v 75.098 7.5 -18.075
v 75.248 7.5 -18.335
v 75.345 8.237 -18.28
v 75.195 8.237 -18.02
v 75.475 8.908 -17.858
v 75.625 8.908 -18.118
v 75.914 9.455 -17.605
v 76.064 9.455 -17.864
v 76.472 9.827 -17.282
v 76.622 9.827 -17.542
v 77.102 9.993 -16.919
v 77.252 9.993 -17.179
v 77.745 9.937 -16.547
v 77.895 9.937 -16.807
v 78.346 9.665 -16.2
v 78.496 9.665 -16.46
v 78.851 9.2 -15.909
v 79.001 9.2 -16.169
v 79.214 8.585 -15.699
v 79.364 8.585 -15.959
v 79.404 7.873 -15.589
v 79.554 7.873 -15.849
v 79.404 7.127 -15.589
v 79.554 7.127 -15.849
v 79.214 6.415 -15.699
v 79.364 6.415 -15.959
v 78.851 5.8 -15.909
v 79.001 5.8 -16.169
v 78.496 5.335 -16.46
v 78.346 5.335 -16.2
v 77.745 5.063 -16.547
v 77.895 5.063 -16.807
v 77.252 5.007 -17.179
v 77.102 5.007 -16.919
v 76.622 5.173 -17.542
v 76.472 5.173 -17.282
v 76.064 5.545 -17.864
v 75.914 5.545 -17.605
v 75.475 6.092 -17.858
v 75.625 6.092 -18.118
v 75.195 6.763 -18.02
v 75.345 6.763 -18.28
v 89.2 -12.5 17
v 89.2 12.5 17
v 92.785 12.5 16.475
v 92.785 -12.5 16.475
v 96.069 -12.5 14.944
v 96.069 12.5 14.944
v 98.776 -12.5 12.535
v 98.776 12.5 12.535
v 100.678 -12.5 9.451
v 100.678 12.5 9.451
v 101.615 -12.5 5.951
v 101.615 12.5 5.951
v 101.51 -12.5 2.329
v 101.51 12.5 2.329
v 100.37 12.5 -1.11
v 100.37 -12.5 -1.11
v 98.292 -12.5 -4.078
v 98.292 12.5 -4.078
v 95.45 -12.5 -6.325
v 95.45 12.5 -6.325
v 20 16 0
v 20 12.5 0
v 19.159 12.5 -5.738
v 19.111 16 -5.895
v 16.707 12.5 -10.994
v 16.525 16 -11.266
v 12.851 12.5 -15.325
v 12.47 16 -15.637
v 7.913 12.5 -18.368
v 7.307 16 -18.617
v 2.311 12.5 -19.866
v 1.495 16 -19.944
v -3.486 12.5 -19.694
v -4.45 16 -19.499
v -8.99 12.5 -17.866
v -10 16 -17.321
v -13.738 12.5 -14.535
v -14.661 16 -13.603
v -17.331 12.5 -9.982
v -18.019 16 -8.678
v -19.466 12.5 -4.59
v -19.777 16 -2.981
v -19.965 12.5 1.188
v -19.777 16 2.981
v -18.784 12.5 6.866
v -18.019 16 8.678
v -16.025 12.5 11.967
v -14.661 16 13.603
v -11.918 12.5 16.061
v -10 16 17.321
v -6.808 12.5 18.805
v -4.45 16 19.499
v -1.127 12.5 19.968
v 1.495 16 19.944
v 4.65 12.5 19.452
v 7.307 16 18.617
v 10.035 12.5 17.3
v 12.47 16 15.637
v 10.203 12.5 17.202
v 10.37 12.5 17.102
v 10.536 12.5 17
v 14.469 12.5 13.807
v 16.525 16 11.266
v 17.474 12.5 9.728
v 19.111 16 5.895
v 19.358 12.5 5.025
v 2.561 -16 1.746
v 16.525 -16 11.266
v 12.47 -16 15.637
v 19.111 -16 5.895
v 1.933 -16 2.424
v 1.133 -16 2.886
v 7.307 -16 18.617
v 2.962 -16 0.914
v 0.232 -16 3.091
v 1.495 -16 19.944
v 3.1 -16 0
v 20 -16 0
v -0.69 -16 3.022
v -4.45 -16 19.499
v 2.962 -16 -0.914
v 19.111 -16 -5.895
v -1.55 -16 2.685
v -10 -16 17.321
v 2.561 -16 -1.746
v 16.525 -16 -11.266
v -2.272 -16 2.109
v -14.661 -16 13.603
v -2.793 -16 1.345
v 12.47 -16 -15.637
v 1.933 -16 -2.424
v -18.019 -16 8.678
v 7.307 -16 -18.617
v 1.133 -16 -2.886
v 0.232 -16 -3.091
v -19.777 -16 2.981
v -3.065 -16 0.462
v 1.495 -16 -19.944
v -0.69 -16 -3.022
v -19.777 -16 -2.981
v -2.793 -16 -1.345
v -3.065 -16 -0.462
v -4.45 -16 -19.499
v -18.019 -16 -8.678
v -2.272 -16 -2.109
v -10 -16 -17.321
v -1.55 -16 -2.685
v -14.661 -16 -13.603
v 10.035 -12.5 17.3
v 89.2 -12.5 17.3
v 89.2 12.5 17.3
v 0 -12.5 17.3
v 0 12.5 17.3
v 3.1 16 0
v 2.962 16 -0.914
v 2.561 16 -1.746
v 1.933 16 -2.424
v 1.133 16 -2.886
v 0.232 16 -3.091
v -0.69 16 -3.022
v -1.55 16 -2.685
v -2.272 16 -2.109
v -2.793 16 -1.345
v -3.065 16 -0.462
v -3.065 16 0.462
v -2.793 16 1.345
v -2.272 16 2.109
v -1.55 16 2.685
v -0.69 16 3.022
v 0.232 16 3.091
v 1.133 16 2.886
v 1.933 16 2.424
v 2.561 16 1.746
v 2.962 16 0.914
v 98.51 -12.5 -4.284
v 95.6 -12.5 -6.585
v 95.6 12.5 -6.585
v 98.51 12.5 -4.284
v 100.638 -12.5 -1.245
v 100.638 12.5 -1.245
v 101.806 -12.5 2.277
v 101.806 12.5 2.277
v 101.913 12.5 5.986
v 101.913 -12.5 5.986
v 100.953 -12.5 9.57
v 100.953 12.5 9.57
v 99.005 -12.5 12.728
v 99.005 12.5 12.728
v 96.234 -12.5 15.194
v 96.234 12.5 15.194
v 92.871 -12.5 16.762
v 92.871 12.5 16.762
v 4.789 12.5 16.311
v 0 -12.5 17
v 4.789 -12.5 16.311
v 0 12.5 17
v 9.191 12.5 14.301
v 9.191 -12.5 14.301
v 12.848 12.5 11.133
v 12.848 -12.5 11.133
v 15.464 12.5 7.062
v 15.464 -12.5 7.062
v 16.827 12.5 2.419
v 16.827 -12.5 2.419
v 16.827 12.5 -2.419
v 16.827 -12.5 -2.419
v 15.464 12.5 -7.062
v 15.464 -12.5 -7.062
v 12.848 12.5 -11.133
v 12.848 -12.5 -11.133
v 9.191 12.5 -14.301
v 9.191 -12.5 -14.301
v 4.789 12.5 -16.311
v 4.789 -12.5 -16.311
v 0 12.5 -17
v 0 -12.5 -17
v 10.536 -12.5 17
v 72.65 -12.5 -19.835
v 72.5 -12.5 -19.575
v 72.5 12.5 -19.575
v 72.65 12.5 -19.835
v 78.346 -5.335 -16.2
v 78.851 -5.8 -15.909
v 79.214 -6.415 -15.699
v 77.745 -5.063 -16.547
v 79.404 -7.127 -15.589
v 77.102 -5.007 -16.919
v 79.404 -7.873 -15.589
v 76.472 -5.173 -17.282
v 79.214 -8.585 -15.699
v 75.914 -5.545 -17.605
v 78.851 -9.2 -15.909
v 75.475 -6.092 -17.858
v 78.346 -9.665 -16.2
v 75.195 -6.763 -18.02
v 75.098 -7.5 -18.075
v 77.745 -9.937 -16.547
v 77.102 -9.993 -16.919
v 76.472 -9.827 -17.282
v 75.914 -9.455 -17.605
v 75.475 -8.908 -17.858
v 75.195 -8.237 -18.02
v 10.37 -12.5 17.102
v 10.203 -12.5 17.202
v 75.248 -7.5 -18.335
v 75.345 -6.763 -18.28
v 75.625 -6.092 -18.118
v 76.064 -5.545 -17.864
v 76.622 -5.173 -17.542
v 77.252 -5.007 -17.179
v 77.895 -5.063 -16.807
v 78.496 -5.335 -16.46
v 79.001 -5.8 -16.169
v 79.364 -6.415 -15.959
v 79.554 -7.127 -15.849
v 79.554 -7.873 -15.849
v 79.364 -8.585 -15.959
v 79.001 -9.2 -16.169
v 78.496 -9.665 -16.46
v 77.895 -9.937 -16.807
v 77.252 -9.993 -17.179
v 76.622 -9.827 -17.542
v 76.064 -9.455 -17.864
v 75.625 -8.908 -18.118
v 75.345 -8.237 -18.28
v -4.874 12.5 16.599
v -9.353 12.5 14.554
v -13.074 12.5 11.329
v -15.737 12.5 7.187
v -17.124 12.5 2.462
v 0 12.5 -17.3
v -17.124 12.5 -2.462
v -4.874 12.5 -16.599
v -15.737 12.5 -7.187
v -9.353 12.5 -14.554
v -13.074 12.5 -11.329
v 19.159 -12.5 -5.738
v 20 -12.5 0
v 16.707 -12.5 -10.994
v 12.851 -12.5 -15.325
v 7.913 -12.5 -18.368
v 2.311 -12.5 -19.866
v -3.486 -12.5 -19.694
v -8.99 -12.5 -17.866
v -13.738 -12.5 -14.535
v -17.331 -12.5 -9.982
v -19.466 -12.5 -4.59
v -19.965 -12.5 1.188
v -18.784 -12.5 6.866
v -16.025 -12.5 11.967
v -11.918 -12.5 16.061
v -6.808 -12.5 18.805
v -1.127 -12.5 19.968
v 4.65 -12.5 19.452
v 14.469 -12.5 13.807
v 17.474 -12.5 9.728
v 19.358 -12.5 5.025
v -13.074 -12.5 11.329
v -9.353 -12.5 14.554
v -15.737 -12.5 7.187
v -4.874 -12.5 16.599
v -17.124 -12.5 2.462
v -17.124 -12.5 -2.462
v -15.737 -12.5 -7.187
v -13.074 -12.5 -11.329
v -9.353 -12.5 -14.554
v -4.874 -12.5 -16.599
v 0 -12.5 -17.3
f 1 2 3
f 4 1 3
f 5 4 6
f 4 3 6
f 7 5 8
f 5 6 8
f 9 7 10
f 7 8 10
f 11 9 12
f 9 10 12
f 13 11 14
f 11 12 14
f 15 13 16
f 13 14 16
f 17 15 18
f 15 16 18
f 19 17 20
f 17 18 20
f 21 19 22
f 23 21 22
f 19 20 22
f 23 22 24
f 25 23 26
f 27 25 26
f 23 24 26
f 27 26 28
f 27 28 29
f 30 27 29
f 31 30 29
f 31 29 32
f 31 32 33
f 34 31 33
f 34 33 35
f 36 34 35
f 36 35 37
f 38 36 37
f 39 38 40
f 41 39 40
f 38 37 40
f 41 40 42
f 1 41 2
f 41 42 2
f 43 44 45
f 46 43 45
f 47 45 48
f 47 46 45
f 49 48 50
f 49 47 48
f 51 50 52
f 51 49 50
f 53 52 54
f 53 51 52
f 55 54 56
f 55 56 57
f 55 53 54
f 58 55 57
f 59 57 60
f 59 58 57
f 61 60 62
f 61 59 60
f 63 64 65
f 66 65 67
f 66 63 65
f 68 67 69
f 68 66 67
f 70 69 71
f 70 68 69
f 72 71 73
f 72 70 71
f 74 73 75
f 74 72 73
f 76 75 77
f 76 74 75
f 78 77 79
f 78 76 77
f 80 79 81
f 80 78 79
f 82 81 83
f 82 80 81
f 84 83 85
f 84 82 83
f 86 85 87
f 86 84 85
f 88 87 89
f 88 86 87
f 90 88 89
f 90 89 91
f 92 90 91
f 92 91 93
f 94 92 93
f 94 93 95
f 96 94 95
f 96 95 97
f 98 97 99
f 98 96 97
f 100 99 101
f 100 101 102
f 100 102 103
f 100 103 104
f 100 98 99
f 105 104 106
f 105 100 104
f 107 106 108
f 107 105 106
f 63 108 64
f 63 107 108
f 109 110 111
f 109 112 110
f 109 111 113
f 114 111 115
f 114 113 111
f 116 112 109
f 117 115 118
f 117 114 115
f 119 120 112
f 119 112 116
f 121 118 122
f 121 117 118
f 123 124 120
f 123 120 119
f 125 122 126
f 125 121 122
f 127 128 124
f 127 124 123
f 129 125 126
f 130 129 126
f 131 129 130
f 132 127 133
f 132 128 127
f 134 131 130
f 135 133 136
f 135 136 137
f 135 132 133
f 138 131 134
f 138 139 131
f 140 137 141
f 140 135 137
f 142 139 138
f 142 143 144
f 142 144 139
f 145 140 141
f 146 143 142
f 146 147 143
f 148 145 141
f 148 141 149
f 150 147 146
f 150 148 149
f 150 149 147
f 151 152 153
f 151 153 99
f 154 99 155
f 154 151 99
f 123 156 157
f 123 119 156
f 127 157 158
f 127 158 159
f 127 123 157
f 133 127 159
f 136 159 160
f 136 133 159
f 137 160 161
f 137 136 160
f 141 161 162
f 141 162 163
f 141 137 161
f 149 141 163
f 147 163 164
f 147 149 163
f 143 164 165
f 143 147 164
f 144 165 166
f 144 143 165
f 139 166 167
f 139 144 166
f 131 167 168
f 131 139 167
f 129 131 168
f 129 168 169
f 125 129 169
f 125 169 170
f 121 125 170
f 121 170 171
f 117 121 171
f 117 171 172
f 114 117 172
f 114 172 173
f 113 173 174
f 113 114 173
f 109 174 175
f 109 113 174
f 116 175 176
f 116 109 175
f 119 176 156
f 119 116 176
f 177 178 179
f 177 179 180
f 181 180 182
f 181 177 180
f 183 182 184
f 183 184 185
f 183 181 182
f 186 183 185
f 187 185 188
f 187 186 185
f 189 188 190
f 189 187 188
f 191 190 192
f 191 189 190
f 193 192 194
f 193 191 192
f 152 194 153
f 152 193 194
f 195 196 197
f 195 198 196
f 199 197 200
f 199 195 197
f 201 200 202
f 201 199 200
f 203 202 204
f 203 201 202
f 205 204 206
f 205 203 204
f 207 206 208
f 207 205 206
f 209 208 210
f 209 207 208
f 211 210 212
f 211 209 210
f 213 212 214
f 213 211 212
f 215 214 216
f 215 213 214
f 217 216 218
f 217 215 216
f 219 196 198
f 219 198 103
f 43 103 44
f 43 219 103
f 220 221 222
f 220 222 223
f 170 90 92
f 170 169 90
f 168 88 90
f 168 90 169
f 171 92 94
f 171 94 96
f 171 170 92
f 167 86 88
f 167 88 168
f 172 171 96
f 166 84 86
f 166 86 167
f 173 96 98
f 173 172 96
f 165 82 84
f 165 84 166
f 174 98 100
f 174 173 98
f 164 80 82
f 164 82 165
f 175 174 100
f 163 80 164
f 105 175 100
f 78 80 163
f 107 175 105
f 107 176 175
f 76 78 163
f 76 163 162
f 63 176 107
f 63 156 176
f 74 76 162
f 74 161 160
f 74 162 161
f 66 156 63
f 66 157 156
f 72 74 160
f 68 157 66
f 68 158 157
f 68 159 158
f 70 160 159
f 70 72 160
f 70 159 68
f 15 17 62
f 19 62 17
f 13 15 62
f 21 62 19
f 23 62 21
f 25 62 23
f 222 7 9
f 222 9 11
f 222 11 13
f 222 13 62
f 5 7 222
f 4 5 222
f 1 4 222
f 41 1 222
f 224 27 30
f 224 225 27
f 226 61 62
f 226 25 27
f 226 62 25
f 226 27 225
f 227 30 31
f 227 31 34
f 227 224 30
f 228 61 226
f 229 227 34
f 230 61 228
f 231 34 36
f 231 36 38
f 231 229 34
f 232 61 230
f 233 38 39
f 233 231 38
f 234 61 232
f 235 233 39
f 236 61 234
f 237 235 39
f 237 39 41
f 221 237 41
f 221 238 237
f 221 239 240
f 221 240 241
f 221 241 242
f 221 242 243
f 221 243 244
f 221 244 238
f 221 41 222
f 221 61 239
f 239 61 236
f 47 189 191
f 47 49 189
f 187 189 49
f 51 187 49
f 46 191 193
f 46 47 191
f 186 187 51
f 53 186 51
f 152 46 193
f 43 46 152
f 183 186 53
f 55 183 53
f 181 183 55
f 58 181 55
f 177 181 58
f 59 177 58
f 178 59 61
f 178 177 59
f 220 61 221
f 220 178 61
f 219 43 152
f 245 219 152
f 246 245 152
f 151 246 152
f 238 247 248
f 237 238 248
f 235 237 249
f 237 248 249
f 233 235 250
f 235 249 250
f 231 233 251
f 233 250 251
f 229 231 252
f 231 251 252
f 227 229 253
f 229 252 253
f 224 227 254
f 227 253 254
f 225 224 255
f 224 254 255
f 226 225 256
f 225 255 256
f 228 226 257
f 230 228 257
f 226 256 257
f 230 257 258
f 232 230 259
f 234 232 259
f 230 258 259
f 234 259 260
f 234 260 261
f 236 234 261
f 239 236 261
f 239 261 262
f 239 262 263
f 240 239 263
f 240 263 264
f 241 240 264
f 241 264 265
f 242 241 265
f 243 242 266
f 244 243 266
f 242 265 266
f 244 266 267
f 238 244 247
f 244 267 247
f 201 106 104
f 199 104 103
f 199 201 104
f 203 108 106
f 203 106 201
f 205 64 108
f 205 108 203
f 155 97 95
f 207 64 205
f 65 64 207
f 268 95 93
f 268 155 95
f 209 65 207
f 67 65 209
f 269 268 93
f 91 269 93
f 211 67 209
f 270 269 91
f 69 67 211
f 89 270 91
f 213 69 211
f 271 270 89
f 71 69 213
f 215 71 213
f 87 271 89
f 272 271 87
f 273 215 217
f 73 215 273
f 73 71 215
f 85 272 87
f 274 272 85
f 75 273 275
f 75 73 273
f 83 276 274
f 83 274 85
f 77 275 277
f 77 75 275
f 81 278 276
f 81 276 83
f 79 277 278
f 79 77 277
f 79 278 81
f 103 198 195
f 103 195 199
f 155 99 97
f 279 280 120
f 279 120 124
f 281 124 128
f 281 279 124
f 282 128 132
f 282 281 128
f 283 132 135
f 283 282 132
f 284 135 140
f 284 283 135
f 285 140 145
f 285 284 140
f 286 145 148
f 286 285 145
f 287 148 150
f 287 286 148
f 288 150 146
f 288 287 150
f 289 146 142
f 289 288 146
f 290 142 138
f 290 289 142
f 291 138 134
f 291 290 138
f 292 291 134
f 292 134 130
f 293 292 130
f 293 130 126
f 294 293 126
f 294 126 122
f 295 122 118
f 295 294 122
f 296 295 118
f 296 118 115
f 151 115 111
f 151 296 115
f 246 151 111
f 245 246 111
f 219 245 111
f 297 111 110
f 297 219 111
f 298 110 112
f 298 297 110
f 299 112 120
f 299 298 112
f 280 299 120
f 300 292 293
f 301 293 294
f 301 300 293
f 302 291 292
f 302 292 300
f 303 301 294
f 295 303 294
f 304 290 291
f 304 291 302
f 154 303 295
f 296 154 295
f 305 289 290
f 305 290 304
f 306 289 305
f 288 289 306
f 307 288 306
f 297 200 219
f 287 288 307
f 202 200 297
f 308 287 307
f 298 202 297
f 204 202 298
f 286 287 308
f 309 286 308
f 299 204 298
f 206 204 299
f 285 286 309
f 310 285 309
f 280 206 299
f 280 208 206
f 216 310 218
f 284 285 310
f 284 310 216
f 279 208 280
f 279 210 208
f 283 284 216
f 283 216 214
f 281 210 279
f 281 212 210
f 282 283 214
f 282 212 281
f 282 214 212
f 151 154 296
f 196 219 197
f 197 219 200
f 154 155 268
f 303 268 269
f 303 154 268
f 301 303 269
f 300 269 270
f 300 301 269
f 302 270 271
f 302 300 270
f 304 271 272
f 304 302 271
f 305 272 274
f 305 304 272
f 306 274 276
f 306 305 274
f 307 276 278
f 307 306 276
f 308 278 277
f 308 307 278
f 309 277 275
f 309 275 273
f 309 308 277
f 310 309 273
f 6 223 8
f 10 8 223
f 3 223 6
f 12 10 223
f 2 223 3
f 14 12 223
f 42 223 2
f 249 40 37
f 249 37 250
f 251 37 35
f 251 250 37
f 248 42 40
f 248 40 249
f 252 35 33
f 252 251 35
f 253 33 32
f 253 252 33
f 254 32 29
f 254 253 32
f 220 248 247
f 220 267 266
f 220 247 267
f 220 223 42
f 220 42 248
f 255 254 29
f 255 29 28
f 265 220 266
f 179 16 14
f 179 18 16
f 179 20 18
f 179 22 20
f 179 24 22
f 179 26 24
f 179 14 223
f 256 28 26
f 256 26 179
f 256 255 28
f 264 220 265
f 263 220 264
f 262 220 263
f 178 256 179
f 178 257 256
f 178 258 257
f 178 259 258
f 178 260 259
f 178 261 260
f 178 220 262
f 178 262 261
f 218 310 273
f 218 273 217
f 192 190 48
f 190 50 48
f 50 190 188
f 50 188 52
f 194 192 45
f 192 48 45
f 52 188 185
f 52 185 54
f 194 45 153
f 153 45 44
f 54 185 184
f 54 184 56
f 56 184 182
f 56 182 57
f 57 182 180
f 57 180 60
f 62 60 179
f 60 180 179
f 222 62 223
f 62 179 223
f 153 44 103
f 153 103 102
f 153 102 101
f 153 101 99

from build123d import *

# Parameters (mm, degrees)
EXTRUDE_THIN2_DEPTH = 25
SKETCH4_R           = 2.5
CUT_EXTRUDE1_DEPTH  = 0.3


with BuildPart() as part:
    # Sketch1 → Revolve1 (revolve)
    with BuildSketch(Plane.XY):
        Polygon((3.1, 16), (3.1, -16), (20, -16), (20, -12.5), (17, -12.5), (17, 12.5), (20, 12.5), (20, 16), align=None)
    revolve(axis=Axis((0, -1363.747655385, 0), (0, 1, 0)))

    # Sketch2 → Extrude-Thin2 (add)
    with BuildSketch(Plane(origin=(0, -12.5, 0), x_dir=(1, 0, 0), z_dir=(0, 1, 0))):
        with BuildLine():
            ThreePointArc((0, 17), (-17, 0), (0, -17))
            Line((0, -17), (89.2, -17))
            ThreePointArc((89.2, -17), (101.274072829, -7.735238064), (95.45, 6.325317547))
            Line((95.45, 6.325317547), (72.5003268, 19.575317547))
            Line((72.5003268, 19.575317547), (72.6503268, 19.835125168))
            Line((72.6503268, 19.835125168), (95.6, 6.585125168))
            ThreePointArc((95.6, 6.585125168), (101.563850577, -7.812883777), (89.2, -17.3))
            Line((89.2, -17.3), (0, -17.3))
            ThreePointArc((0, -17.3), (-17.3, 0), (0, 17.3))
            Line((0, 17.3), (0, 17))
        make_face()
    extrude(amount=EXTRUDE_THIN2_DEPTH)

    # Sketch4 → Cut-Extrude1 (cut)
    with BuildSketch(Plane(origin=(26.751442841, 0, -46.334858177), x_dir=(-0.866025404, 0, -0.5), z_dir=(0.5, 0, -0.866025404))):
        with Locations((-58.499466018, -7.5)):
            Circle(SKETCH4_R)
        with Locations((-58.499466018, 7.5)):
            Circle(SKETCH4_R)
    extrude(amount=-CUT_EXTRUDE1_DEPTH, mode=Mode.SUBTRACT)


solid = part.part
